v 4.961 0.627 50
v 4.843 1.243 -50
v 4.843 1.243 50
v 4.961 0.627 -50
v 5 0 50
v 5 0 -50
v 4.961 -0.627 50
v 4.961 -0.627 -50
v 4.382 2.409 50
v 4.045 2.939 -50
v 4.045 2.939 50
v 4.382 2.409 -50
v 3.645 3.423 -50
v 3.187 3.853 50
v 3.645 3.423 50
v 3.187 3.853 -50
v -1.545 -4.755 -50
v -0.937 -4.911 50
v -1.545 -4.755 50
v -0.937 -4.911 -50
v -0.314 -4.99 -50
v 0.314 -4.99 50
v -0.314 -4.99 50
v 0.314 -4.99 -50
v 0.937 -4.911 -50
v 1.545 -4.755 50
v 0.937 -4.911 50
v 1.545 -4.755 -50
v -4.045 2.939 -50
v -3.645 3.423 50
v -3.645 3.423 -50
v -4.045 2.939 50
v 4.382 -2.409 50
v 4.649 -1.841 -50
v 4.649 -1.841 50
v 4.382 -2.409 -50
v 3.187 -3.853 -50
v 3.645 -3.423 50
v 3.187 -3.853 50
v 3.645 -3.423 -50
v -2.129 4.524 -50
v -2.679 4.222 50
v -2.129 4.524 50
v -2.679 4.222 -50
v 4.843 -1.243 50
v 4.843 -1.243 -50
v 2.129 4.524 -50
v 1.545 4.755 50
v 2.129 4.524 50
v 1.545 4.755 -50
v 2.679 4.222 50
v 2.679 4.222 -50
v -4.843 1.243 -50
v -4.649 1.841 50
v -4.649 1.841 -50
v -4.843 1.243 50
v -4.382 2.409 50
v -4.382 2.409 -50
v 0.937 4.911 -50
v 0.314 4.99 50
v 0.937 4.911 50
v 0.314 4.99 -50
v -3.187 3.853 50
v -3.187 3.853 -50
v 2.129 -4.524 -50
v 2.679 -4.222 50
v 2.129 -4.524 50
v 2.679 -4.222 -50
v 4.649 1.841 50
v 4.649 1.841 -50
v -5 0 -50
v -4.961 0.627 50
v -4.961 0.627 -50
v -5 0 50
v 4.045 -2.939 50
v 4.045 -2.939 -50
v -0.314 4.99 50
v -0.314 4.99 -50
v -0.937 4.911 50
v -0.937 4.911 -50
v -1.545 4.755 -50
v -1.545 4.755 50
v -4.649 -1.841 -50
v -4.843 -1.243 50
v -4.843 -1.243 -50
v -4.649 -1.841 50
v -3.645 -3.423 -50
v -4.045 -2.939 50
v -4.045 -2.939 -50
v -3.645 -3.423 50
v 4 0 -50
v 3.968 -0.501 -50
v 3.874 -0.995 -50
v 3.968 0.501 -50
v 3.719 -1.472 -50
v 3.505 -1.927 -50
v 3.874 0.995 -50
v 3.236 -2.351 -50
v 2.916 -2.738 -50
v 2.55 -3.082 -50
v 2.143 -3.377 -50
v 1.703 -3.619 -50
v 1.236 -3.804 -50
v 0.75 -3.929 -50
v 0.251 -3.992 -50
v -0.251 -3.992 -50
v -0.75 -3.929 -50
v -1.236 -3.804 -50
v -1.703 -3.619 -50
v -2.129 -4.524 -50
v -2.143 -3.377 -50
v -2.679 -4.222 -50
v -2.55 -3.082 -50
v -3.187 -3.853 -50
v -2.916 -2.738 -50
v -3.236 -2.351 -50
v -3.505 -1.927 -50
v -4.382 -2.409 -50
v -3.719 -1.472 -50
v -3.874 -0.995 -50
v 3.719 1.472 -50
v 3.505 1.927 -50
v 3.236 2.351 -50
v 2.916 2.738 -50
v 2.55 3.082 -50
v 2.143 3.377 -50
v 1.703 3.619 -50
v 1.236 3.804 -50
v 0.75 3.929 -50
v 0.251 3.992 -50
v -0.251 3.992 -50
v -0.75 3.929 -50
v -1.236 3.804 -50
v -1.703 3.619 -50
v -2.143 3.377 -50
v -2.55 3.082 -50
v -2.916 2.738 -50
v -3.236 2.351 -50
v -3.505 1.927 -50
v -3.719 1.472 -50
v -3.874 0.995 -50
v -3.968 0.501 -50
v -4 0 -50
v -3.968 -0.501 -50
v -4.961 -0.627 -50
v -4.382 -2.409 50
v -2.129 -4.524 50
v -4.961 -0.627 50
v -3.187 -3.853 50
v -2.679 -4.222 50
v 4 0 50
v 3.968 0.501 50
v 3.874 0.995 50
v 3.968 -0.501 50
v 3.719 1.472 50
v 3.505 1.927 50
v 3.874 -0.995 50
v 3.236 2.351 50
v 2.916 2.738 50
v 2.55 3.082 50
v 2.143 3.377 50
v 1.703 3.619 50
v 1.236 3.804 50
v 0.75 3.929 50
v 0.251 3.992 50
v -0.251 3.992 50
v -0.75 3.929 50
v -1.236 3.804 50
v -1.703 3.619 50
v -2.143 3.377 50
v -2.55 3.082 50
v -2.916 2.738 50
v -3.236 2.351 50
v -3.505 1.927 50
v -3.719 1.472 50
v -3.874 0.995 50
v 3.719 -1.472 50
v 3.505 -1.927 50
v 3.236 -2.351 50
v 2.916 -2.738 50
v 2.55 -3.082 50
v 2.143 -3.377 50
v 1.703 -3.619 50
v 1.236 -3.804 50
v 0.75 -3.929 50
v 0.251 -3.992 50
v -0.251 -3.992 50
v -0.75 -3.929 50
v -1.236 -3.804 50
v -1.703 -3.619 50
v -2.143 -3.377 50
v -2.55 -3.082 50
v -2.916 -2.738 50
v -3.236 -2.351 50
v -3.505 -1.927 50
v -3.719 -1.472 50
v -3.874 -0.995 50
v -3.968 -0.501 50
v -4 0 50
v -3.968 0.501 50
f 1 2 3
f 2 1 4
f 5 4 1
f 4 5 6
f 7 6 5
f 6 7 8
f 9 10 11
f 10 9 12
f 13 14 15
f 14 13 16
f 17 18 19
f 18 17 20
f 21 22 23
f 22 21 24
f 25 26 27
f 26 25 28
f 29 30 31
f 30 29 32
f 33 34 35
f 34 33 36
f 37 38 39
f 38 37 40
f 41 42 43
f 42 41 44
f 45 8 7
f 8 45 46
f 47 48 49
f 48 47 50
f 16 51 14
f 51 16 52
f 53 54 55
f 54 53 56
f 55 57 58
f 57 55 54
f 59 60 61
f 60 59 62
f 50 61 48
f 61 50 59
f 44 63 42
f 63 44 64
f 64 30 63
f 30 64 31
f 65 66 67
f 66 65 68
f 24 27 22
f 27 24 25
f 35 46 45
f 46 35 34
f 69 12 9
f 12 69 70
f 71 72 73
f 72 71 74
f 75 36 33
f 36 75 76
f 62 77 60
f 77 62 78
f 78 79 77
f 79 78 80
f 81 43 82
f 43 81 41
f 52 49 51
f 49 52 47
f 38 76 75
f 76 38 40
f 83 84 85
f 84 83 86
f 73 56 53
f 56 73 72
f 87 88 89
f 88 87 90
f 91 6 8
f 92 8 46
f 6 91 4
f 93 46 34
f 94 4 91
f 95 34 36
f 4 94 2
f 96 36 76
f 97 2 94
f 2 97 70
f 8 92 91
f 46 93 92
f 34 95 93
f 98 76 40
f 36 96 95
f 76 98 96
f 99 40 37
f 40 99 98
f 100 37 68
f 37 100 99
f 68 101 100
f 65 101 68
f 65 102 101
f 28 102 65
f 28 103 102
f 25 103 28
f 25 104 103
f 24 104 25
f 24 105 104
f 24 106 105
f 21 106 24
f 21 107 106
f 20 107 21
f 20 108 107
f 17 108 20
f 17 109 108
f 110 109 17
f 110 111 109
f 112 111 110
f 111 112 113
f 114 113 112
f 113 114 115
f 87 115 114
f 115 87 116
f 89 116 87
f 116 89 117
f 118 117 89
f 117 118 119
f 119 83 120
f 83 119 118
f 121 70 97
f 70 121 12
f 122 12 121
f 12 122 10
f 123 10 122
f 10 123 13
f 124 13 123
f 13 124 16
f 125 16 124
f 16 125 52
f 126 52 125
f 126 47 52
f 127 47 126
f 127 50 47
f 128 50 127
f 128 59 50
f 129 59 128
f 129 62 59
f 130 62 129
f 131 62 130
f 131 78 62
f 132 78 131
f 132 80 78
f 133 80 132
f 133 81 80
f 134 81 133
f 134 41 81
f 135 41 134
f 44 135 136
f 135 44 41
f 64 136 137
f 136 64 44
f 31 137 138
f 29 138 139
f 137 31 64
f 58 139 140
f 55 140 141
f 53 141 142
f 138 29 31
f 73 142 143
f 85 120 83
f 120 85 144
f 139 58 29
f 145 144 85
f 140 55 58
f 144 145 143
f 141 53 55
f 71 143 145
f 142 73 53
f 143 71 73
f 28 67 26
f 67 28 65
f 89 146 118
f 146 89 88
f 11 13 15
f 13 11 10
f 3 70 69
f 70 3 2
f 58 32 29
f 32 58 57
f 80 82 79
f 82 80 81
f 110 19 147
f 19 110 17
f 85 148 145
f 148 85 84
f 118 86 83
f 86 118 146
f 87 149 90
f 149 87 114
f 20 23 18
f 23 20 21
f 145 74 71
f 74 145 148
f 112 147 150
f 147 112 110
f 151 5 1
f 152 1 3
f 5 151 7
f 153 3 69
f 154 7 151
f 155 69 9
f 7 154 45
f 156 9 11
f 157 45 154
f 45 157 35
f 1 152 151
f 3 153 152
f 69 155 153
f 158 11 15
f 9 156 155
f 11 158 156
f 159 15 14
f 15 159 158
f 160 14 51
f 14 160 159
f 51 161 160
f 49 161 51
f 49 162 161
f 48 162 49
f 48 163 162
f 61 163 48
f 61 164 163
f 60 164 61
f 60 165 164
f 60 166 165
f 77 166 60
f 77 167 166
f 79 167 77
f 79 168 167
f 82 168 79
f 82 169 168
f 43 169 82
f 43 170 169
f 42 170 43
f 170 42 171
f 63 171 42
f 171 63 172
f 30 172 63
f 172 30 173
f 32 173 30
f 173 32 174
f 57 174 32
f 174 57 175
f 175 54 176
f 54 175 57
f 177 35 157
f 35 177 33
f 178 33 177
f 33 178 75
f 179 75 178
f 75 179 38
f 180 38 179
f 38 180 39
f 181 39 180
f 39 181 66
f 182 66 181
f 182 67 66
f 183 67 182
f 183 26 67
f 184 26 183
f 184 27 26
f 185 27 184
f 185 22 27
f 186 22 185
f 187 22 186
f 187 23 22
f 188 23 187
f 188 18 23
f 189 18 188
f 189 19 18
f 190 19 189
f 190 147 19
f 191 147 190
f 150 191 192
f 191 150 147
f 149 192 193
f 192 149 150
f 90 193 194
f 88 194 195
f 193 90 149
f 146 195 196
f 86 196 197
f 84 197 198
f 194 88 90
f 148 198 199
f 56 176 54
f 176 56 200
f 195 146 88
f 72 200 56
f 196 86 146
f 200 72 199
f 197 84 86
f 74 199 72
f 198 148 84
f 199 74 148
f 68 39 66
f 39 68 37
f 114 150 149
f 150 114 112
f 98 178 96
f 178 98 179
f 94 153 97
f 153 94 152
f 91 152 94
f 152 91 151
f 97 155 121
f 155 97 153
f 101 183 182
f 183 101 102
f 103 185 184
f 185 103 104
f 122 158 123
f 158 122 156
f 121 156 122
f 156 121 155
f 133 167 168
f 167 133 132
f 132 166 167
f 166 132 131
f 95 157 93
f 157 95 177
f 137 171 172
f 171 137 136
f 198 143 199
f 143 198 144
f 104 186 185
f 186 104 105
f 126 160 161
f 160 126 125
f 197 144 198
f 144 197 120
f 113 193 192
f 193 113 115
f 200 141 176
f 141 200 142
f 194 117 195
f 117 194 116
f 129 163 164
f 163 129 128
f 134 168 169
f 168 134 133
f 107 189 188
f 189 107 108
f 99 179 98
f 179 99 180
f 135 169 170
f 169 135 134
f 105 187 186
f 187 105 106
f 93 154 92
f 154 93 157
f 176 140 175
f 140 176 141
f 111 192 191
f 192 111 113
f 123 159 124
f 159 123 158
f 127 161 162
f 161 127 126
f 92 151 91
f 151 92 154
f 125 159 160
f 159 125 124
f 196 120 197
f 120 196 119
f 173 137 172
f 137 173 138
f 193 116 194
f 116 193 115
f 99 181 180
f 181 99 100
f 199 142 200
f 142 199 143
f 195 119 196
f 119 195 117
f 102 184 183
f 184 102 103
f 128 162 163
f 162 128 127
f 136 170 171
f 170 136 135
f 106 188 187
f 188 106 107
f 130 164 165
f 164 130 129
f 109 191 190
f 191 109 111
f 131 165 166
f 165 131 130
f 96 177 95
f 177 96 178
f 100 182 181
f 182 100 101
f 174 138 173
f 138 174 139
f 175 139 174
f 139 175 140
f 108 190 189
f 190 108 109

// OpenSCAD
$fn = 50;


difference() {
	union() {
		translate(v = [0, 0, -50.0000000000]) {
			cylinder(h = 100, r = 5.0000000000);
		}
	}
	union() {
		translate(v = [0, 0, -100.0000000000]) {
			cylinder(h = 200, r = 4.0000000000);
		}
	}
}
